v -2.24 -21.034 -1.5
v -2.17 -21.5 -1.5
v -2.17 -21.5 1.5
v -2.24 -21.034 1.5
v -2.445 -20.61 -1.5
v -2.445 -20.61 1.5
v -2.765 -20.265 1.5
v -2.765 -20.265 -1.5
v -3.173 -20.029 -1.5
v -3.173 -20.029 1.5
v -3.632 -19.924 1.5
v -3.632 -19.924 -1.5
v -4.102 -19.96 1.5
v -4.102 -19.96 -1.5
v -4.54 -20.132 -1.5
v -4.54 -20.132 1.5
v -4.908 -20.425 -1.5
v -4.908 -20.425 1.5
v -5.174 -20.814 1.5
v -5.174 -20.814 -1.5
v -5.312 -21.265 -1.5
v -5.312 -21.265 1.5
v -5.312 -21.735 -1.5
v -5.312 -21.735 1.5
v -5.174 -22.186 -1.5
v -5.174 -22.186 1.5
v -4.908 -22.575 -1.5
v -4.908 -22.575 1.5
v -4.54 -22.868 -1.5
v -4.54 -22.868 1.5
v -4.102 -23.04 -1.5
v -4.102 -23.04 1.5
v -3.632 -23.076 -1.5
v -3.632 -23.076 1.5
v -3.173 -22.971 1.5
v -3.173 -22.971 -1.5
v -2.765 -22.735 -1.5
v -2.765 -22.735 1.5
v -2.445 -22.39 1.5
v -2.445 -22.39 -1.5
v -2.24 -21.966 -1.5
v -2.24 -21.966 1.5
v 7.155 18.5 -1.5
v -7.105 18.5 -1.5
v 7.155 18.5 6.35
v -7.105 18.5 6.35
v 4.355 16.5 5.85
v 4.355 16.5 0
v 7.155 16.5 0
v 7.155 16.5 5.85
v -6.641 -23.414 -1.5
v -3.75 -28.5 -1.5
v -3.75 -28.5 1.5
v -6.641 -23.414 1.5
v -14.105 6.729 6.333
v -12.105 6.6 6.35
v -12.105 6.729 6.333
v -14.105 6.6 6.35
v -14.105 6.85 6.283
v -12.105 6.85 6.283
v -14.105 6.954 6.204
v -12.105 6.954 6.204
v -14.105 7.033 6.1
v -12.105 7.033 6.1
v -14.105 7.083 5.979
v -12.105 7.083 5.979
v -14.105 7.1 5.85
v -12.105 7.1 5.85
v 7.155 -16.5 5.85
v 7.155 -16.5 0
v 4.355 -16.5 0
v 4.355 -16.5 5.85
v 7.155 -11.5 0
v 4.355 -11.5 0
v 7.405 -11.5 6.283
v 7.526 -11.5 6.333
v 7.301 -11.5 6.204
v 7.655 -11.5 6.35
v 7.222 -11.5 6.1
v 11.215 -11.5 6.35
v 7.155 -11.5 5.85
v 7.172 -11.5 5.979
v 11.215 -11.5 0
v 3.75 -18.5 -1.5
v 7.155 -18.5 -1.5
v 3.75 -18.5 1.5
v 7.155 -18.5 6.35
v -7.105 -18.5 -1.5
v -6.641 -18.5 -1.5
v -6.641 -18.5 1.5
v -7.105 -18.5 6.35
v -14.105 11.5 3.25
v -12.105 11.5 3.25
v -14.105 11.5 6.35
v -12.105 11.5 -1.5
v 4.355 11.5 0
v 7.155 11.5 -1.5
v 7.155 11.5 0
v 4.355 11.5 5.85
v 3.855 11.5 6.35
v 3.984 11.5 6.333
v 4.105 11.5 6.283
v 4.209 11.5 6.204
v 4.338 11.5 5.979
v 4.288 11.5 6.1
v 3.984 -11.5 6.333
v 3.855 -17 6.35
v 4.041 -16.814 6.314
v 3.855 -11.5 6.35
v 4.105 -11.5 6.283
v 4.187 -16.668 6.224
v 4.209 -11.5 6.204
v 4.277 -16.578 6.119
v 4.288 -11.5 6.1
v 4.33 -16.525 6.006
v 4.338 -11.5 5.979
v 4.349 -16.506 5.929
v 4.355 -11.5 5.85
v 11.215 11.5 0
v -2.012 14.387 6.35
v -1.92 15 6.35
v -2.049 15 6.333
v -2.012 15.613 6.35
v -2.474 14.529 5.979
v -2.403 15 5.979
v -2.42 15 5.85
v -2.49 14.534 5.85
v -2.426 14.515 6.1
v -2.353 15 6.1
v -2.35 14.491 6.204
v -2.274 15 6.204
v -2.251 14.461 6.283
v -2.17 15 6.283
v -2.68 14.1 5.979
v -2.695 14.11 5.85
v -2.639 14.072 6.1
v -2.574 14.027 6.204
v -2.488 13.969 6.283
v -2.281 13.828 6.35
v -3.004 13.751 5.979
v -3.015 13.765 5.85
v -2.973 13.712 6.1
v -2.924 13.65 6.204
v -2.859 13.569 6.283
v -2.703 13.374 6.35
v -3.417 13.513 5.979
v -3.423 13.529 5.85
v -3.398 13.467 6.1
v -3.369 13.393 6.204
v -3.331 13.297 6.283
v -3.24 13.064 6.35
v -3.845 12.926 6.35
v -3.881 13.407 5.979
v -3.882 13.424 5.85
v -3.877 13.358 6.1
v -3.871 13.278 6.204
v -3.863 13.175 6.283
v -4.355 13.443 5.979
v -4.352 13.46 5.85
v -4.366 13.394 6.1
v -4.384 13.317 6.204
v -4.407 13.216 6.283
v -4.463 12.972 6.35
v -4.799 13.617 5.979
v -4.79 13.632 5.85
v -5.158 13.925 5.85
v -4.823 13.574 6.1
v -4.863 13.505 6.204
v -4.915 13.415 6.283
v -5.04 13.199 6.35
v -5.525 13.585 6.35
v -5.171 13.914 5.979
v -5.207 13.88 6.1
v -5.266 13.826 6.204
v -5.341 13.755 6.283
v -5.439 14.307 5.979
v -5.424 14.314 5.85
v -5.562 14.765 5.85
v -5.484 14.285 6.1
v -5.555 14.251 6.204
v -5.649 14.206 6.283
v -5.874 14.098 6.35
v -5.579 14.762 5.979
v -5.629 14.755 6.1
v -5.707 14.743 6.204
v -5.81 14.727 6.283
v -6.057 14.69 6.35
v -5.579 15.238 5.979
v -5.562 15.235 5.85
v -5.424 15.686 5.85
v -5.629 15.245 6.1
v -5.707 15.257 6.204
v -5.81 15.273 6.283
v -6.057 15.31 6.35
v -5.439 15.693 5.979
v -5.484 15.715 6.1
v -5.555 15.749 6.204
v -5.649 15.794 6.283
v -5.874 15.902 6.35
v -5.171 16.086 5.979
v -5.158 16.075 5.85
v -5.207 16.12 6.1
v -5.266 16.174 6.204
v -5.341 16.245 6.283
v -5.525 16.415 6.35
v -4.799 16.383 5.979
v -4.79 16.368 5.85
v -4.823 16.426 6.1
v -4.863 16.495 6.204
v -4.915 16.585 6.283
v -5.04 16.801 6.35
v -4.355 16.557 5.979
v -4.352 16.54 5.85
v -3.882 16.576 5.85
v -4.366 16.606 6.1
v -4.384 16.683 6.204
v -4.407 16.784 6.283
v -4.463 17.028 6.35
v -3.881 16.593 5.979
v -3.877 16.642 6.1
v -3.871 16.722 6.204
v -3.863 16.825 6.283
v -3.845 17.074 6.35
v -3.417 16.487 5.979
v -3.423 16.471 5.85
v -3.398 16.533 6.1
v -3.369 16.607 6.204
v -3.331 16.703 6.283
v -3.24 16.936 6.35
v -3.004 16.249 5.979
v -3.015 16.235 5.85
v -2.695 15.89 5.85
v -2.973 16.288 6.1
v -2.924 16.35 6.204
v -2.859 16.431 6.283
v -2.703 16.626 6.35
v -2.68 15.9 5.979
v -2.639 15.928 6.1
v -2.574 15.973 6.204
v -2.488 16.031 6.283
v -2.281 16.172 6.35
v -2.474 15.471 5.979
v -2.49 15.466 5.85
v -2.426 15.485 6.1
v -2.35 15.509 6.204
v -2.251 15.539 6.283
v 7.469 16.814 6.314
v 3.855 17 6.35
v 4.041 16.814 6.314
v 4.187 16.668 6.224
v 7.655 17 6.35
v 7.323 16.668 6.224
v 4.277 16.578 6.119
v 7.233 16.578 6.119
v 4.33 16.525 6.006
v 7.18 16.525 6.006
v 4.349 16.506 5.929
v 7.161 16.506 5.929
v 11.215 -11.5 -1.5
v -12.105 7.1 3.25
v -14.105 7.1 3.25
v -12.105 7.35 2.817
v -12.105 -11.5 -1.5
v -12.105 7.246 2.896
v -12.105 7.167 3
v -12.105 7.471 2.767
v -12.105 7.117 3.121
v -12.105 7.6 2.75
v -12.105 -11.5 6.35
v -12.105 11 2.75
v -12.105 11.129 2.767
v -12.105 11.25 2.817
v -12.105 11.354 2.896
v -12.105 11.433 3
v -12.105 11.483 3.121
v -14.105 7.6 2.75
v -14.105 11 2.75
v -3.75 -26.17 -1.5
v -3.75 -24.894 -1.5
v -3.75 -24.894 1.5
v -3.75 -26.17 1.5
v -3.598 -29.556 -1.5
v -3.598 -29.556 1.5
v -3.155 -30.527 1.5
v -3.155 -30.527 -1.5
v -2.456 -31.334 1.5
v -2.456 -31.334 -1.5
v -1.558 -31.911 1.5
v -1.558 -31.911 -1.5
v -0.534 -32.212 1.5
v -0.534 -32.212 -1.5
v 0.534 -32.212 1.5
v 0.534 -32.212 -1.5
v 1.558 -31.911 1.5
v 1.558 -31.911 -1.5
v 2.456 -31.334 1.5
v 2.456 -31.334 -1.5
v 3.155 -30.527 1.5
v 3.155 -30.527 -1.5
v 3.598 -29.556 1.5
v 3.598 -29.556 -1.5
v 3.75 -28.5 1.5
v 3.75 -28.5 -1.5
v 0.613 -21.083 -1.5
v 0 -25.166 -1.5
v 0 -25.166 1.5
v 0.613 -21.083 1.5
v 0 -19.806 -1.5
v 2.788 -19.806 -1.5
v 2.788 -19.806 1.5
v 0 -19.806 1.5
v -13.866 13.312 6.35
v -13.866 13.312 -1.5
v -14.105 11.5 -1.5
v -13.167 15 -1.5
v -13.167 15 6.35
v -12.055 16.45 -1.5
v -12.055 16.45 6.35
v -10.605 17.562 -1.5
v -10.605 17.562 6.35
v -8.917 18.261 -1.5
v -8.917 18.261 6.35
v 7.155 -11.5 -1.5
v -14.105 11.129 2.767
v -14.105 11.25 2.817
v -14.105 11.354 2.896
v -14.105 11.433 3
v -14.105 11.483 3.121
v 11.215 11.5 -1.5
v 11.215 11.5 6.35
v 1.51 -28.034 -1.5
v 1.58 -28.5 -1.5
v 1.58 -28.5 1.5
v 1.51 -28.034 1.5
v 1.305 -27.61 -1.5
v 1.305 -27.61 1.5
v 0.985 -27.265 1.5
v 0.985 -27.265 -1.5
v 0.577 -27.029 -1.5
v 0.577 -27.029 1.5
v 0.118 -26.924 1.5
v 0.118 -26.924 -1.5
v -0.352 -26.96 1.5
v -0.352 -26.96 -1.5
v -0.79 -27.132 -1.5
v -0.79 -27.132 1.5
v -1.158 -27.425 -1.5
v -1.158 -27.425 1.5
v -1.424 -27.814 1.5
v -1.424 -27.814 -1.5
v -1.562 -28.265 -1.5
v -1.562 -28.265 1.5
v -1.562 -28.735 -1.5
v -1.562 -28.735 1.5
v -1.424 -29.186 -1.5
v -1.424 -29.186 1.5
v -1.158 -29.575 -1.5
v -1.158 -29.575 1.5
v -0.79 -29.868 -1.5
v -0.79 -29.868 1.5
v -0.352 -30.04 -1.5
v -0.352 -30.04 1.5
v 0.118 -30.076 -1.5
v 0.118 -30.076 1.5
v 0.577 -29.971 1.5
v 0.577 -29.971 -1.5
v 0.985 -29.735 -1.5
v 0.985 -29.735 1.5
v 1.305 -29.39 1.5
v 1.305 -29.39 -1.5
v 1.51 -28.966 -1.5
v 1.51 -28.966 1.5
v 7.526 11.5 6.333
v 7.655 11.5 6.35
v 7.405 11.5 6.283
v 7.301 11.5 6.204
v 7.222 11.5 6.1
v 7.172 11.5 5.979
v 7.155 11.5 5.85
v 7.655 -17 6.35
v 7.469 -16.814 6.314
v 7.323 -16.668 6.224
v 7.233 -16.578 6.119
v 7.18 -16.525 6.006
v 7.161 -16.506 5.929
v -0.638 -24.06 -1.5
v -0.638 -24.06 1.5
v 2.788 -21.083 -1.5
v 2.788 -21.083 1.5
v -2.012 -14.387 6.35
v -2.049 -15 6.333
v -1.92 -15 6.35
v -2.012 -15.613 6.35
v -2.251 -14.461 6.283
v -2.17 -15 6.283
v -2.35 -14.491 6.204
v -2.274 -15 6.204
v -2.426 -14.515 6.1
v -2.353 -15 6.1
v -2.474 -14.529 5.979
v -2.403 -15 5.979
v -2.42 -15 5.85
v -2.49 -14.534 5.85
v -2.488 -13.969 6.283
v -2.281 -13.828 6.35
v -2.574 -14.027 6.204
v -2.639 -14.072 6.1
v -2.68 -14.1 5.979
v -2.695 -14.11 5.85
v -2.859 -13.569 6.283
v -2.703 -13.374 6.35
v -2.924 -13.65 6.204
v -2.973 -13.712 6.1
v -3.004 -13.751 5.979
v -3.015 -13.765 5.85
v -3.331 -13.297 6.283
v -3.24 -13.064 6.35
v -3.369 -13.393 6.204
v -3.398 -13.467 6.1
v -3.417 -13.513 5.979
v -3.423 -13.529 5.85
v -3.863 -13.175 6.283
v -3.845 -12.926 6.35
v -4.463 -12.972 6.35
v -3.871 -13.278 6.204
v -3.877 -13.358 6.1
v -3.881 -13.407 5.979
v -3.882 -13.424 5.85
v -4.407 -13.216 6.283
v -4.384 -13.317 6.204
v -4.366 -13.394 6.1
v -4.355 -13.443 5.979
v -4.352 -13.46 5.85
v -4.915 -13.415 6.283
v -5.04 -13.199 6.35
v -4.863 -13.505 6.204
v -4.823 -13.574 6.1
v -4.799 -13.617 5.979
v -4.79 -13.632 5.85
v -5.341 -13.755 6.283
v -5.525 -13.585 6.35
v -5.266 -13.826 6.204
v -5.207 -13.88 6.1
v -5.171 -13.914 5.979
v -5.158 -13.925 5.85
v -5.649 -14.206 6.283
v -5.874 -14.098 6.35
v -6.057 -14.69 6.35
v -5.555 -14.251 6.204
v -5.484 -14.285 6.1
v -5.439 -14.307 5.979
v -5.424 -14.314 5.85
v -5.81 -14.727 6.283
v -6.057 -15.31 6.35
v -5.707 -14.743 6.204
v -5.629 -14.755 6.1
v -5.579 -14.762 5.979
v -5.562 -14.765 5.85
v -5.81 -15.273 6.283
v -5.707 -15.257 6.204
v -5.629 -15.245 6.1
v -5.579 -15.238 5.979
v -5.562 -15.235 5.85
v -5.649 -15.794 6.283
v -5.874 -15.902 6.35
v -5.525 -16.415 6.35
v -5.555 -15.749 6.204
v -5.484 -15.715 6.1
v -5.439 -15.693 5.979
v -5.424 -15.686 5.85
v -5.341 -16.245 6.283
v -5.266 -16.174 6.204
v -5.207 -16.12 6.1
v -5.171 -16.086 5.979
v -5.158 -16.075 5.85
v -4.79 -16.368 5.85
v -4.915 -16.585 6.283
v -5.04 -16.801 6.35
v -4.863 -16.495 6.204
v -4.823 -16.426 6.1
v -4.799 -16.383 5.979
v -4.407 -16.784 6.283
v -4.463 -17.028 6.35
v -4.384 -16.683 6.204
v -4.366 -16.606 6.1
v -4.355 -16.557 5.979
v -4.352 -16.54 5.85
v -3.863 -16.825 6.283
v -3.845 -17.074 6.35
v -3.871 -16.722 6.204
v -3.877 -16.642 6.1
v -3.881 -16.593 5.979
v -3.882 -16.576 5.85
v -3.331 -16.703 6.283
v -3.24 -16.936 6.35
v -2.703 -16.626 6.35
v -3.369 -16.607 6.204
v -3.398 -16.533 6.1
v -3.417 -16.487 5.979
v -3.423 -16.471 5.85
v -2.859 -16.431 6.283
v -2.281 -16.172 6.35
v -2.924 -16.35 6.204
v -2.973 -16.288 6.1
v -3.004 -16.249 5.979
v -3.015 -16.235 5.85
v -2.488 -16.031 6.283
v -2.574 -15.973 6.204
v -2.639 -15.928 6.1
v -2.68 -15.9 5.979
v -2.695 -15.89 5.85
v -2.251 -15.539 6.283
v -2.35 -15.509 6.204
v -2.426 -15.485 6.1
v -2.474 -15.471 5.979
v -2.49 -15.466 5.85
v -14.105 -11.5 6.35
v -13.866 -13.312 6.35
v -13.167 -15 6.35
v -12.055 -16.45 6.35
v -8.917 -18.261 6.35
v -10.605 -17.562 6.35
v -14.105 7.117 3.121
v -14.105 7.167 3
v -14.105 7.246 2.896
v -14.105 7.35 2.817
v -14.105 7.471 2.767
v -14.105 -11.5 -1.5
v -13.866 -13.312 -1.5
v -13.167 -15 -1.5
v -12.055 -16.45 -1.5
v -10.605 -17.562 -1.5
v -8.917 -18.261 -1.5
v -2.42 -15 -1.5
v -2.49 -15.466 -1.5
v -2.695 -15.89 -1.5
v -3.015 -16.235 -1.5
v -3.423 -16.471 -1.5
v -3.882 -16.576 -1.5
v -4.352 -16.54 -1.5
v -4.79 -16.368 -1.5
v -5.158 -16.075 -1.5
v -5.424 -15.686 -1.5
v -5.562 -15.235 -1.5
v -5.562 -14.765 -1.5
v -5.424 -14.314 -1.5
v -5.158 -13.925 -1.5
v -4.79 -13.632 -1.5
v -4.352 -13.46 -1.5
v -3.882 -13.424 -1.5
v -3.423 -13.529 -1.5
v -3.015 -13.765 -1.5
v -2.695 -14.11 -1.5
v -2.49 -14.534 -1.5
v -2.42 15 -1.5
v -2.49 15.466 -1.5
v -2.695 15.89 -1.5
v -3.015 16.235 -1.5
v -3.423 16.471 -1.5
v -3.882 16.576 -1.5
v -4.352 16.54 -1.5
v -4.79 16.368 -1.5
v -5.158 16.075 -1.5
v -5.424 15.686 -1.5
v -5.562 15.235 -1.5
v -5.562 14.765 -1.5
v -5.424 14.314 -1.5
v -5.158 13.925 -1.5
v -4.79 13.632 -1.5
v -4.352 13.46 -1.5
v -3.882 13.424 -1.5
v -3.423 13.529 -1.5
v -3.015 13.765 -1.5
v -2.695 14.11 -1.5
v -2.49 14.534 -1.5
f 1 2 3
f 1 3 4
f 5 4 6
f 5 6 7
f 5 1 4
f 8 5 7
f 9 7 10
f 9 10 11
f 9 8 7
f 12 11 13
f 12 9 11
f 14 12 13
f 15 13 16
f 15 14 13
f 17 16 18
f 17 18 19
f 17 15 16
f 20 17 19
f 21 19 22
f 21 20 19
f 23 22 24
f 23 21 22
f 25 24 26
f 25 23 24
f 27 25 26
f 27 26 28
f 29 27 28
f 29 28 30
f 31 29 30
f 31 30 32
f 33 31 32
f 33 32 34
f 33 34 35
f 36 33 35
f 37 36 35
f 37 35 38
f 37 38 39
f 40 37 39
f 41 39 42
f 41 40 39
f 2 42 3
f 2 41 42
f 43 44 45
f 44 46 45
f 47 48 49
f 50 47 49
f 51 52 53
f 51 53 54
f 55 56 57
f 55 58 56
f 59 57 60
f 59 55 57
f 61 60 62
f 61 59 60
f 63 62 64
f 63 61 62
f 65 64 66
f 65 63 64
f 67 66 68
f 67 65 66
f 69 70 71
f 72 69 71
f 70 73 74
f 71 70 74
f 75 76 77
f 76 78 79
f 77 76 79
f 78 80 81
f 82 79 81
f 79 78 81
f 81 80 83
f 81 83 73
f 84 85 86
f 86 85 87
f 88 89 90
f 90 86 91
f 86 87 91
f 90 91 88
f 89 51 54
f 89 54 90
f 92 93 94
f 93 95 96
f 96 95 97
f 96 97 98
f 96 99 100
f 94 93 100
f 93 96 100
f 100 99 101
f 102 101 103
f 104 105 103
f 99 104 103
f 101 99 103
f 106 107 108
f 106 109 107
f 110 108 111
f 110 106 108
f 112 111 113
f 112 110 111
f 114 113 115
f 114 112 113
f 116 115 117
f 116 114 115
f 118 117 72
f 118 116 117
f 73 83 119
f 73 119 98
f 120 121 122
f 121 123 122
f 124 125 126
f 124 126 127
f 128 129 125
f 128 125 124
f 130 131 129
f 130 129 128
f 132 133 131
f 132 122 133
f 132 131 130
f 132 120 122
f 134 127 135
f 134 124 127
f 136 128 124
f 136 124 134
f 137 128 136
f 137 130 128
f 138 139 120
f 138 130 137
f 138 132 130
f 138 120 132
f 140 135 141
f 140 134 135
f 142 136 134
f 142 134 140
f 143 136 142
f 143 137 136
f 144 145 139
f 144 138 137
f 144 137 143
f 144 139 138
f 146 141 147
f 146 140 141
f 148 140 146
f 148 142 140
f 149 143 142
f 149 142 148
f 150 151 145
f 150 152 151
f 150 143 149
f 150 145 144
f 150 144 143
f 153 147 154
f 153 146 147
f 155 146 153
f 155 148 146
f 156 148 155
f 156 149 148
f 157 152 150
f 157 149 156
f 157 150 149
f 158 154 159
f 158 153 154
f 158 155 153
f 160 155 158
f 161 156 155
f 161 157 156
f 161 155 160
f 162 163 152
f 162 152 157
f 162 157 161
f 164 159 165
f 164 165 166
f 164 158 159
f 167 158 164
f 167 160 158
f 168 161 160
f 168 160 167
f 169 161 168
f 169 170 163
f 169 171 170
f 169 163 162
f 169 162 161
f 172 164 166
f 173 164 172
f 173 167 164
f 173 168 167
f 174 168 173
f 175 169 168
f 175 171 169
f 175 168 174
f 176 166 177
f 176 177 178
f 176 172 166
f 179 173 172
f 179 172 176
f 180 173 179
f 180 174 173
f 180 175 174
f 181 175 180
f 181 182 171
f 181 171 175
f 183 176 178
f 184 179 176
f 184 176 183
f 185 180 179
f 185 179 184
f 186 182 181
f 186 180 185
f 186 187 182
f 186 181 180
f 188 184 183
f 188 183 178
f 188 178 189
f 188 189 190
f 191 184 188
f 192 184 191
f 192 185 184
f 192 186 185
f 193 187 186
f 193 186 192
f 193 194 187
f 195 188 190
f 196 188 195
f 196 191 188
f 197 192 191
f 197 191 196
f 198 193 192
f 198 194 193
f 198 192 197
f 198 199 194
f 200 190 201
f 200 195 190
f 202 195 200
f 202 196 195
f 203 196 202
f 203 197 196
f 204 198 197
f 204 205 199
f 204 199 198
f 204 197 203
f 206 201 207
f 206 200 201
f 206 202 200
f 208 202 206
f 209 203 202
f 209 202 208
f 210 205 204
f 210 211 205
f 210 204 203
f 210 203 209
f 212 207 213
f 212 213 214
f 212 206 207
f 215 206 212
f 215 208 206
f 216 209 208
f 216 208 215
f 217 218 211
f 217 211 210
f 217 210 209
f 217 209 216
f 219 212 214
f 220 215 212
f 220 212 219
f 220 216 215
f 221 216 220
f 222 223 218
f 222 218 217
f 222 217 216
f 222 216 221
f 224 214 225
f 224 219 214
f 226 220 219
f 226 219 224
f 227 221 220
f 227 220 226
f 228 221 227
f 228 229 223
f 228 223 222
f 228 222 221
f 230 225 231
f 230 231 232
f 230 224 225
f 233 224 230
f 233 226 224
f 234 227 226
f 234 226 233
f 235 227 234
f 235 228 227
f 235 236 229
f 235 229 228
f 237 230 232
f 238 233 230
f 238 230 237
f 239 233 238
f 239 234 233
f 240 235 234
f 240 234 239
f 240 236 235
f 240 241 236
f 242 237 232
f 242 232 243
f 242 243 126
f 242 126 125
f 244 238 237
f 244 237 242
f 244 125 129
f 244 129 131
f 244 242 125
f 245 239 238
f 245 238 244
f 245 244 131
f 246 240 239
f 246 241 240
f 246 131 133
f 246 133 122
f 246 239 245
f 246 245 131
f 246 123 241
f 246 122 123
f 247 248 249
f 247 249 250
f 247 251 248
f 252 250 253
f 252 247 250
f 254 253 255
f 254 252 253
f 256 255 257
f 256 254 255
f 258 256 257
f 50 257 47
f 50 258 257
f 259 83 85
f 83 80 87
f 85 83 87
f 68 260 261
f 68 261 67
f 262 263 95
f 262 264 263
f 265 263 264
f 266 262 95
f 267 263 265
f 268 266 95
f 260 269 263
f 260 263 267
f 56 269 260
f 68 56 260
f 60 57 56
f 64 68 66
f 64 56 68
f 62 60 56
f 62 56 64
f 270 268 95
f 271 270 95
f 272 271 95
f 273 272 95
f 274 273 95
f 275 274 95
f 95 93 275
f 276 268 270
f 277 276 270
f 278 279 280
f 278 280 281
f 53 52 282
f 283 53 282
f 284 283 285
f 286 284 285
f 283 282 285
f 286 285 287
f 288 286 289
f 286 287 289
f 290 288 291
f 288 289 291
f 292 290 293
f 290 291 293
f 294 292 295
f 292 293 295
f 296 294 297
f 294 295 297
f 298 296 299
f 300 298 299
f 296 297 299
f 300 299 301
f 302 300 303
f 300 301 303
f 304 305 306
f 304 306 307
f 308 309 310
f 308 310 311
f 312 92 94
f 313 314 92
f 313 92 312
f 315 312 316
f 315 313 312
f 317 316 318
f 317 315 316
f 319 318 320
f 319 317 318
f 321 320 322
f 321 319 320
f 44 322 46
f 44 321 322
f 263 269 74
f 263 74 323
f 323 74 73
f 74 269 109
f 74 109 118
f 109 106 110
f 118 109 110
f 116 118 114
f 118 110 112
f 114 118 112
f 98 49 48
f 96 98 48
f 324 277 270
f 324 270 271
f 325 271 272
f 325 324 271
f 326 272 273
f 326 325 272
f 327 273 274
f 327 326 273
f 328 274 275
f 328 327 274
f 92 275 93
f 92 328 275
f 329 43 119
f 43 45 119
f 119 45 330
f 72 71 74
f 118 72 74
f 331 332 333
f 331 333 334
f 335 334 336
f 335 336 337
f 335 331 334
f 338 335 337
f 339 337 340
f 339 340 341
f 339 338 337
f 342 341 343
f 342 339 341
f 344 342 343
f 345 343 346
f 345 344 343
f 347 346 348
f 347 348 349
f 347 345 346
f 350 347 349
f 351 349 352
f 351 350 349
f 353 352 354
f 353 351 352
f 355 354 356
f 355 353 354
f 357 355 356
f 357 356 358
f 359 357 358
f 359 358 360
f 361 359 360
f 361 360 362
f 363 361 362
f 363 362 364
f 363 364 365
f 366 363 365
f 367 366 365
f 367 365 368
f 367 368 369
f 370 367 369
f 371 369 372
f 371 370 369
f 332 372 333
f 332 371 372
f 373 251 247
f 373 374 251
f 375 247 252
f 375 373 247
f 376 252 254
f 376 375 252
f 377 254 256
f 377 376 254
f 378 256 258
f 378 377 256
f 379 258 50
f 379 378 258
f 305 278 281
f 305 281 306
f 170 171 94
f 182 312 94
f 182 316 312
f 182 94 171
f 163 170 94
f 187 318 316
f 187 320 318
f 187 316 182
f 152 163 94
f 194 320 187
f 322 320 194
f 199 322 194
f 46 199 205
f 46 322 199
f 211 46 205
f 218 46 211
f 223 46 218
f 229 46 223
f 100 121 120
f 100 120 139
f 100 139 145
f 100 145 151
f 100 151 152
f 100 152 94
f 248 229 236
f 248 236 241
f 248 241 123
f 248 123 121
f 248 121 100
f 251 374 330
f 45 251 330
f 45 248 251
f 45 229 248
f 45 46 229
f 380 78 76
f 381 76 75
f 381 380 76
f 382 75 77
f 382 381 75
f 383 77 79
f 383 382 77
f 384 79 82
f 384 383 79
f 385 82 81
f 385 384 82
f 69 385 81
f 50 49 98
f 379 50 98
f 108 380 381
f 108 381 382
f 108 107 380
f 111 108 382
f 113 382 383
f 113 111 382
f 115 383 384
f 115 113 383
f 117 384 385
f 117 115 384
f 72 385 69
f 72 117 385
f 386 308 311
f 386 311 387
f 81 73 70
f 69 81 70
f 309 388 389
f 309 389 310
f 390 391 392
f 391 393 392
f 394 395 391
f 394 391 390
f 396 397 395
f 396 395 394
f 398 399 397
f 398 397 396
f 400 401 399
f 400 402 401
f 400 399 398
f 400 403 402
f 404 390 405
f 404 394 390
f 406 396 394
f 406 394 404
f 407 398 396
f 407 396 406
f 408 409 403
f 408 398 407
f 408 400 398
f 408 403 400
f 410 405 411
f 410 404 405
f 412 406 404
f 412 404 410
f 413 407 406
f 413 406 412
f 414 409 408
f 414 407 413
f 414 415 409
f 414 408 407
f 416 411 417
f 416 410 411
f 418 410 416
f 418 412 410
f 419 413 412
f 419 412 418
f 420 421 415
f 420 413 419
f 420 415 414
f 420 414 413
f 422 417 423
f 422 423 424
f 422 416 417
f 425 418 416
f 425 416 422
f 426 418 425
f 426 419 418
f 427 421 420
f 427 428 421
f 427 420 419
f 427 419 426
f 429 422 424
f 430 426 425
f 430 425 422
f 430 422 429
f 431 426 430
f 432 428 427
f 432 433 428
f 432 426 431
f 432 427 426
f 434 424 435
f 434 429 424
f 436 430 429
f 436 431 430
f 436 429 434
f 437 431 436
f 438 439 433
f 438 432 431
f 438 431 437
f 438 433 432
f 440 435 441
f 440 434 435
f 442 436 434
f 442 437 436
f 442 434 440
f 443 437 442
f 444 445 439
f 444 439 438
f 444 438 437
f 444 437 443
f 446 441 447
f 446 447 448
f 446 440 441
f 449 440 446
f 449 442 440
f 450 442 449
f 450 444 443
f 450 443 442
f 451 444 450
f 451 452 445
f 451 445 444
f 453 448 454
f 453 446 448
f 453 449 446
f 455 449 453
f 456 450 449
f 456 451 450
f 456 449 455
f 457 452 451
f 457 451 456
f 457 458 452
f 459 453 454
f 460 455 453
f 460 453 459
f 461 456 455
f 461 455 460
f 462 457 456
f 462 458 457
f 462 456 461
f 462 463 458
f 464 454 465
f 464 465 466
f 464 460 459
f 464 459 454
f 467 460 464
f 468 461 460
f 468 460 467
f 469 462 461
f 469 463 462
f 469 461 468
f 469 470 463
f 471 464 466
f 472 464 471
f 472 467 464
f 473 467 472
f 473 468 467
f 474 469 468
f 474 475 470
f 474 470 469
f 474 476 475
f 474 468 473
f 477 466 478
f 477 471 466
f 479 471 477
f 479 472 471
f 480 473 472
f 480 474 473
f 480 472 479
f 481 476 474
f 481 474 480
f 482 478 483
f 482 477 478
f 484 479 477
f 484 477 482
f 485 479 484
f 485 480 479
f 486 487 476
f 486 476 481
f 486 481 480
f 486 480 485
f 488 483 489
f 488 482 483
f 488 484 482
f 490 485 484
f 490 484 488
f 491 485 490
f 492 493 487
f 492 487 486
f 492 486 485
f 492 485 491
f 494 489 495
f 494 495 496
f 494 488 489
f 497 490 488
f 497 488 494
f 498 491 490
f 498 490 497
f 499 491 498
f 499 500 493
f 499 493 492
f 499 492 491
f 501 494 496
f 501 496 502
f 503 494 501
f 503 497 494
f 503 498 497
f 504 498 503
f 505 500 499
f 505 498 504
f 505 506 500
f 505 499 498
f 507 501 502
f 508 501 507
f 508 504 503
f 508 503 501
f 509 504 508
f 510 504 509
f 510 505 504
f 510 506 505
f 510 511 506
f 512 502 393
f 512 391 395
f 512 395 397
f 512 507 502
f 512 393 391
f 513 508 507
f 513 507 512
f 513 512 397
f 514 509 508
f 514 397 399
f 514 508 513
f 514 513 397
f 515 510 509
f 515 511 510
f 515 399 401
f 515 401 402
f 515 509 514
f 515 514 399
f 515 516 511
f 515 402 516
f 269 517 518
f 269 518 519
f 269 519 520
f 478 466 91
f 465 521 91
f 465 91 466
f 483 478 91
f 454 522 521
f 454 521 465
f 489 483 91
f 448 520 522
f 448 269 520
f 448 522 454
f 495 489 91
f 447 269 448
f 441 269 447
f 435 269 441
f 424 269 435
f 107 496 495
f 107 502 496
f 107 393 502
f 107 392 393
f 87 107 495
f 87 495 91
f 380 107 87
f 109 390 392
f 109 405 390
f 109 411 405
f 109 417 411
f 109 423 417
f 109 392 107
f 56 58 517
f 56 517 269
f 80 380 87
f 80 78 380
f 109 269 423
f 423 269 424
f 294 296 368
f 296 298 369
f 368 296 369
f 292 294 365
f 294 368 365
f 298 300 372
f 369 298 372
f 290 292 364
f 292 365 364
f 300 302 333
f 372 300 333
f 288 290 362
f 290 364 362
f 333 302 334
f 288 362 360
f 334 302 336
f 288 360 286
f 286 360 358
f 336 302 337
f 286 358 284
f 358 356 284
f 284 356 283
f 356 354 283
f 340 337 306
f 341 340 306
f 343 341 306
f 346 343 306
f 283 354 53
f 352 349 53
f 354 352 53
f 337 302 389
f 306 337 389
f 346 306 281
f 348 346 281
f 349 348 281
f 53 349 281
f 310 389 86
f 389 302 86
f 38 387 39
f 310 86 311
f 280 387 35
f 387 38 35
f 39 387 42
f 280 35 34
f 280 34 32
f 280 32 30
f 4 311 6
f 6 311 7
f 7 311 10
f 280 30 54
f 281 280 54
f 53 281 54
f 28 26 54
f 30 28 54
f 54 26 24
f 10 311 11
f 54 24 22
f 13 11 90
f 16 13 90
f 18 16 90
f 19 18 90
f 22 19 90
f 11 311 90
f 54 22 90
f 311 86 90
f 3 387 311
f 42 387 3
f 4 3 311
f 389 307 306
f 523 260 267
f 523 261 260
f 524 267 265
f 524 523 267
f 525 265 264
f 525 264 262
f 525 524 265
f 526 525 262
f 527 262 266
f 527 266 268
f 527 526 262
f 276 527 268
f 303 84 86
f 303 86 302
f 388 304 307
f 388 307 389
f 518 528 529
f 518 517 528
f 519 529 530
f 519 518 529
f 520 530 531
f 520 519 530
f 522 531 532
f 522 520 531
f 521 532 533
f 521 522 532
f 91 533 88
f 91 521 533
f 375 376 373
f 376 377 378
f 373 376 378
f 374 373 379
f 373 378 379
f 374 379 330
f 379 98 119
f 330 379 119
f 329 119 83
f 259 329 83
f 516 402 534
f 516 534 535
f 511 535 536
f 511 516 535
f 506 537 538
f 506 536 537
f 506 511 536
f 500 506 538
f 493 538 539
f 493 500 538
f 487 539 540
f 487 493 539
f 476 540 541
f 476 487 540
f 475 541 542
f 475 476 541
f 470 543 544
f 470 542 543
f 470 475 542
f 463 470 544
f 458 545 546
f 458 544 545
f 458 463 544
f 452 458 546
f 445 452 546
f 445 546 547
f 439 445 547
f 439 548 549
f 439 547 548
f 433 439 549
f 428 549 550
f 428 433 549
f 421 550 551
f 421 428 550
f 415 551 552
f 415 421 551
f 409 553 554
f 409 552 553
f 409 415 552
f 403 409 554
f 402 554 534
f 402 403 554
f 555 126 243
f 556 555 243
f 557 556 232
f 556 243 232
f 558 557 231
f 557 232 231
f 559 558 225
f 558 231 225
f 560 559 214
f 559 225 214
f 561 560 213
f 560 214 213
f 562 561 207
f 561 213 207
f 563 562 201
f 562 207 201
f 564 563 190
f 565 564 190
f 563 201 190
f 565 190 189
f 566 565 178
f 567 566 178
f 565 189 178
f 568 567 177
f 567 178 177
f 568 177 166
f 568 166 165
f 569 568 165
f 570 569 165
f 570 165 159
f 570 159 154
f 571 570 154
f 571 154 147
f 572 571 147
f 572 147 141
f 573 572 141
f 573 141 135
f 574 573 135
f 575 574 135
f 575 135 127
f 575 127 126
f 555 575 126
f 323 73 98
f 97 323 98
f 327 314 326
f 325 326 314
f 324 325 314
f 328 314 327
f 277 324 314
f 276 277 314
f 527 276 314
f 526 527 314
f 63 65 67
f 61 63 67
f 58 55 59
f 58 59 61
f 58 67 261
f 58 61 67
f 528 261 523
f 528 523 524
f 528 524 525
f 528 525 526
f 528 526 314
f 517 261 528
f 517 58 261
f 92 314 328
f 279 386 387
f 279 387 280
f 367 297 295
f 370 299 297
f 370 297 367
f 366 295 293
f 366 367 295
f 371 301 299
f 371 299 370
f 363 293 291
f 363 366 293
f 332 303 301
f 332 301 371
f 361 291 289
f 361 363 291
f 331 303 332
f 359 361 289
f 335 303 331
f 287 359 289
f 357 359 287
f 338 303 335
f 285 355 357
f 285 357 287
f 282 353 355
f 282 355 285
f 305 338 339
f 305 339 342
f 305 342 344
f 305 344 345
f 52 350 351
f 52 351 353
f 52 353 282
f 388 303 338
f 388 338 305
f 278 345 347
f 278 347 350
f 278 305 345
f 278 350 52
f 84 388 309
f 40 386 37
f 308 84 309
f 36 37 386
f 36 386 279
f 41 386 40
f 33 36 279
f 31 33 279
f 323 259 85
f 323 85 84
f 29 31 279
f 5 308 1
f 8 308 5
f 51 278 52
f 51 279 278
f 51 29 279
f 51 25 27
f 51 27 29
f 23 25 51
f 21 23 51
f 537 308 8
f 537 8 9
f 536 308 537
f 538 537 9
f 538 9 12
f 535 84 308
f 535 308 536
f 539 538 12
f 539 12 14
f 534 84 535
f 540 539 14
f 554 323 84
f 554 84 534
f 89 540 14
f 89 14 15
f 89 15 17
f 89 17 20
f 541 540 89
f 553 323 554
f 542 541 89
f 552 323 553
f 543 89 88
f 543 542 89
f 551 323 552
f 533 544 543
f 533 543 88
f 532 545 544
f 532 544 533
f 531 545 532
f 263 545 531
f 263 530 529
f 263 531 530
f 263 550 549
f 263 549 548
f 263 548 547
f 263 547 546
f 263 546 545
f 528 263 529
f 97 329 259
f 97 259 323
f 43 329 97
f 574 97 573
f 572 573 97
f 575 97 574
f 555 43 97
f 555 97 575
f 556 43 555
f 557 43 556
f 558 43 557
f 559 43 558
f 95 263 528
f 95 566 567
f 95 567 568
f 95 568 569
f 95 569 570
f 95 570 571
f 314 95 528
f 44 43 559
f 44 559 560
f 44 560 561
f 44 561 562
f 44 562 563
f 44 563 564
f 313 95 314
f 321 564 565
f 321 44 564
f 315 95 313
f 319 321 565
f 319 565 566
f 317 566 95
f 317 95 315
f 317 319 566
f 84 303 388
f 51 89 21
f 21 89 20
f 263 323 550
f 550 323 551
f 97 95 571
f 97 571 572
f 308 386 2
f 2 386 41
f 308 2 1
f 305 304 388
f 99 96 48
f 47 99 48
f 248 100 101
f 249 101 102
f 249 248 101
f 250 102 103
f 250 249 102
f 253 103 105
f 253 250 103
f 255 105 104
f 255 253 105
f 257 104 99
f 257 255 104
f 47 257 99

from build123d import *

# Parameters (mm, degrees)
PAD_DEPTH         = 6.35
SKETCH001_W       = 19.26
SKETCH001_H       = 23
PAD001_DEPTH      = 1.5
SKETCH003_R       = 1.58
POCKET_DEPTH      = 92.53341
POCKET_DEPTH_BACK = 97.38341
SKETCH002_W       = 4.4
SKETCH002_H       = 3.6
POCKET001_DEPTH   = 14.106
SKETCH004_R       = 1.58
PAD002_DEPTH      = 3
FILLET_R          = 7
FILLET001_R       = 0.5


with BuildPart() as part:
    # Sketch → Pad (new body)
    with BuildSketch(Plane.XY):
        Polygon((4.355, -11.5), (-12.105, -11.5), (-12.105, 11.5), (4.355, 11.5), (4.355, 16.5), (7.155, 16.5), (7.155, 11.5), (11.215, 11.5), (7.155, 18.5), (-14.105, 18.5), (-14.105, -18.5), (7.155, -18.5), (11.215, -11.5), (7.155, -11.5), (7.155, -16.5), (4.355, -16.5), align=None)
    extrude(amount=PAD_DEPTH)

    # Sketch001 → Pad001 (join)
    with BuildSketch(Plane.XY):
        Polygon((-14.105, 0), (-14.105, 18.5), (7.155, 18.5), (11.215, 11.5), (11.215, -11.5), (7.155, -18.5), (-14.105, -18.5), align=None)
        with Locations((-2.475, 0)):
            Rectangle(SKETCH001_W, SKETCH001_H, mode=Mode.SUBTRACT)
    extrude(amount=-PAD001_DEPTH)

    # Sketch003 → Pocket (cut, two sides)
    with BuildSketch(Plane.XY) as pocket_sk:
        with Locations((-4, 15)):
            Circle(SKETCH003_R)
    pocket = extrude(amount=-POCKET_DEPTH, mode=Mode.SUBTRACT) + extrude(pocket_sk.sketch, amount=POCKET_DEPTH_BACK, mode=Mode.SUBTRACT)

    # Mirrored: Pocket across Sketch003 H_Axis
    add(pocket.mirror(Plane.ZX), mode=Mode.SUBTRACT)

    # Sketch002 → Pocket001 (cut, through all)
    with BuildSketch(Plane.YZ):
        with Locations((9.3, 4.55)):
            Rectangle(SKETCH002_W, SKETCH002_H)
    extrude(amount=-POCKET001_DEPTH, mode=Mode.SUBTRACT)

    # Sketch004 → Pad002 (join)
    with BuildSketch(Plane.XY.offset(-1.5)):
        with BuildLine():
            Line((-6.641136, -18.5), (3.75, -18.5))
            Line((3.75, -18.5), (3.75, -28.5))
            ThreePointArc((-3.75, -28.5), (0, -32.25), (3.75, -28.5))
            Line((-3.75, -28.5), (-6.641136, -23.414276))
            Line((-6.641136, -23.414276), (-6.641136, -18.5))
        make_face()
        with Locations((0, -28.5)):
            Circle(SKETCH004_R, mode=Mode.SUBTRACT)
        with Locations((-3.75, -21.5)):
            Circle(SKETCH004_R, mode=Mode.SUBTRACT)
        Polygon((2.788238, -19.805846), (0, -19.805846), (-0.638352, -24.059963), (-3.75, -24.893727), (-3.75, -26.170431), (0, -25.165621), (0.612686, -21.08255), (2.788238, -21.08255), align=None, mode=Mode.SUBTRACT)
    extrude(amount=PAD002_DEPTH)

    # Fillet
    fillet_edges = [part.edges().sort_by_distance(p)[0] for p in [
        (-14.105, 18.5, 3.175),
        (-14.105, -18.5, 3.175),
    ]]
    fillet(fillet_edges, radius=FILLET_R)

    # Fillet001
    fillet001_edges = [part.edges().sort_by_distance(p)[0] for p in [
        (-5.58, 15, 6.35),
        (-5.58, -15, 6.35),
        (7.155, -14, 6.35),
        (4.355, -14, 6.35),
        (5.755, -16.5, 6.35),
        (4.355, 14, 6.35),
        (5.755, 16.5, 6.35),
        (7.155, 14, 6.35),
        (-13.105, 7.1, 6.35),
        (-13.105, 7.1, 2.75),
        (-13.105, 11.5, 2.75),
    ]]
    fillet(fillet001_edges, radius=FILLET001_R)


solid = part.part
